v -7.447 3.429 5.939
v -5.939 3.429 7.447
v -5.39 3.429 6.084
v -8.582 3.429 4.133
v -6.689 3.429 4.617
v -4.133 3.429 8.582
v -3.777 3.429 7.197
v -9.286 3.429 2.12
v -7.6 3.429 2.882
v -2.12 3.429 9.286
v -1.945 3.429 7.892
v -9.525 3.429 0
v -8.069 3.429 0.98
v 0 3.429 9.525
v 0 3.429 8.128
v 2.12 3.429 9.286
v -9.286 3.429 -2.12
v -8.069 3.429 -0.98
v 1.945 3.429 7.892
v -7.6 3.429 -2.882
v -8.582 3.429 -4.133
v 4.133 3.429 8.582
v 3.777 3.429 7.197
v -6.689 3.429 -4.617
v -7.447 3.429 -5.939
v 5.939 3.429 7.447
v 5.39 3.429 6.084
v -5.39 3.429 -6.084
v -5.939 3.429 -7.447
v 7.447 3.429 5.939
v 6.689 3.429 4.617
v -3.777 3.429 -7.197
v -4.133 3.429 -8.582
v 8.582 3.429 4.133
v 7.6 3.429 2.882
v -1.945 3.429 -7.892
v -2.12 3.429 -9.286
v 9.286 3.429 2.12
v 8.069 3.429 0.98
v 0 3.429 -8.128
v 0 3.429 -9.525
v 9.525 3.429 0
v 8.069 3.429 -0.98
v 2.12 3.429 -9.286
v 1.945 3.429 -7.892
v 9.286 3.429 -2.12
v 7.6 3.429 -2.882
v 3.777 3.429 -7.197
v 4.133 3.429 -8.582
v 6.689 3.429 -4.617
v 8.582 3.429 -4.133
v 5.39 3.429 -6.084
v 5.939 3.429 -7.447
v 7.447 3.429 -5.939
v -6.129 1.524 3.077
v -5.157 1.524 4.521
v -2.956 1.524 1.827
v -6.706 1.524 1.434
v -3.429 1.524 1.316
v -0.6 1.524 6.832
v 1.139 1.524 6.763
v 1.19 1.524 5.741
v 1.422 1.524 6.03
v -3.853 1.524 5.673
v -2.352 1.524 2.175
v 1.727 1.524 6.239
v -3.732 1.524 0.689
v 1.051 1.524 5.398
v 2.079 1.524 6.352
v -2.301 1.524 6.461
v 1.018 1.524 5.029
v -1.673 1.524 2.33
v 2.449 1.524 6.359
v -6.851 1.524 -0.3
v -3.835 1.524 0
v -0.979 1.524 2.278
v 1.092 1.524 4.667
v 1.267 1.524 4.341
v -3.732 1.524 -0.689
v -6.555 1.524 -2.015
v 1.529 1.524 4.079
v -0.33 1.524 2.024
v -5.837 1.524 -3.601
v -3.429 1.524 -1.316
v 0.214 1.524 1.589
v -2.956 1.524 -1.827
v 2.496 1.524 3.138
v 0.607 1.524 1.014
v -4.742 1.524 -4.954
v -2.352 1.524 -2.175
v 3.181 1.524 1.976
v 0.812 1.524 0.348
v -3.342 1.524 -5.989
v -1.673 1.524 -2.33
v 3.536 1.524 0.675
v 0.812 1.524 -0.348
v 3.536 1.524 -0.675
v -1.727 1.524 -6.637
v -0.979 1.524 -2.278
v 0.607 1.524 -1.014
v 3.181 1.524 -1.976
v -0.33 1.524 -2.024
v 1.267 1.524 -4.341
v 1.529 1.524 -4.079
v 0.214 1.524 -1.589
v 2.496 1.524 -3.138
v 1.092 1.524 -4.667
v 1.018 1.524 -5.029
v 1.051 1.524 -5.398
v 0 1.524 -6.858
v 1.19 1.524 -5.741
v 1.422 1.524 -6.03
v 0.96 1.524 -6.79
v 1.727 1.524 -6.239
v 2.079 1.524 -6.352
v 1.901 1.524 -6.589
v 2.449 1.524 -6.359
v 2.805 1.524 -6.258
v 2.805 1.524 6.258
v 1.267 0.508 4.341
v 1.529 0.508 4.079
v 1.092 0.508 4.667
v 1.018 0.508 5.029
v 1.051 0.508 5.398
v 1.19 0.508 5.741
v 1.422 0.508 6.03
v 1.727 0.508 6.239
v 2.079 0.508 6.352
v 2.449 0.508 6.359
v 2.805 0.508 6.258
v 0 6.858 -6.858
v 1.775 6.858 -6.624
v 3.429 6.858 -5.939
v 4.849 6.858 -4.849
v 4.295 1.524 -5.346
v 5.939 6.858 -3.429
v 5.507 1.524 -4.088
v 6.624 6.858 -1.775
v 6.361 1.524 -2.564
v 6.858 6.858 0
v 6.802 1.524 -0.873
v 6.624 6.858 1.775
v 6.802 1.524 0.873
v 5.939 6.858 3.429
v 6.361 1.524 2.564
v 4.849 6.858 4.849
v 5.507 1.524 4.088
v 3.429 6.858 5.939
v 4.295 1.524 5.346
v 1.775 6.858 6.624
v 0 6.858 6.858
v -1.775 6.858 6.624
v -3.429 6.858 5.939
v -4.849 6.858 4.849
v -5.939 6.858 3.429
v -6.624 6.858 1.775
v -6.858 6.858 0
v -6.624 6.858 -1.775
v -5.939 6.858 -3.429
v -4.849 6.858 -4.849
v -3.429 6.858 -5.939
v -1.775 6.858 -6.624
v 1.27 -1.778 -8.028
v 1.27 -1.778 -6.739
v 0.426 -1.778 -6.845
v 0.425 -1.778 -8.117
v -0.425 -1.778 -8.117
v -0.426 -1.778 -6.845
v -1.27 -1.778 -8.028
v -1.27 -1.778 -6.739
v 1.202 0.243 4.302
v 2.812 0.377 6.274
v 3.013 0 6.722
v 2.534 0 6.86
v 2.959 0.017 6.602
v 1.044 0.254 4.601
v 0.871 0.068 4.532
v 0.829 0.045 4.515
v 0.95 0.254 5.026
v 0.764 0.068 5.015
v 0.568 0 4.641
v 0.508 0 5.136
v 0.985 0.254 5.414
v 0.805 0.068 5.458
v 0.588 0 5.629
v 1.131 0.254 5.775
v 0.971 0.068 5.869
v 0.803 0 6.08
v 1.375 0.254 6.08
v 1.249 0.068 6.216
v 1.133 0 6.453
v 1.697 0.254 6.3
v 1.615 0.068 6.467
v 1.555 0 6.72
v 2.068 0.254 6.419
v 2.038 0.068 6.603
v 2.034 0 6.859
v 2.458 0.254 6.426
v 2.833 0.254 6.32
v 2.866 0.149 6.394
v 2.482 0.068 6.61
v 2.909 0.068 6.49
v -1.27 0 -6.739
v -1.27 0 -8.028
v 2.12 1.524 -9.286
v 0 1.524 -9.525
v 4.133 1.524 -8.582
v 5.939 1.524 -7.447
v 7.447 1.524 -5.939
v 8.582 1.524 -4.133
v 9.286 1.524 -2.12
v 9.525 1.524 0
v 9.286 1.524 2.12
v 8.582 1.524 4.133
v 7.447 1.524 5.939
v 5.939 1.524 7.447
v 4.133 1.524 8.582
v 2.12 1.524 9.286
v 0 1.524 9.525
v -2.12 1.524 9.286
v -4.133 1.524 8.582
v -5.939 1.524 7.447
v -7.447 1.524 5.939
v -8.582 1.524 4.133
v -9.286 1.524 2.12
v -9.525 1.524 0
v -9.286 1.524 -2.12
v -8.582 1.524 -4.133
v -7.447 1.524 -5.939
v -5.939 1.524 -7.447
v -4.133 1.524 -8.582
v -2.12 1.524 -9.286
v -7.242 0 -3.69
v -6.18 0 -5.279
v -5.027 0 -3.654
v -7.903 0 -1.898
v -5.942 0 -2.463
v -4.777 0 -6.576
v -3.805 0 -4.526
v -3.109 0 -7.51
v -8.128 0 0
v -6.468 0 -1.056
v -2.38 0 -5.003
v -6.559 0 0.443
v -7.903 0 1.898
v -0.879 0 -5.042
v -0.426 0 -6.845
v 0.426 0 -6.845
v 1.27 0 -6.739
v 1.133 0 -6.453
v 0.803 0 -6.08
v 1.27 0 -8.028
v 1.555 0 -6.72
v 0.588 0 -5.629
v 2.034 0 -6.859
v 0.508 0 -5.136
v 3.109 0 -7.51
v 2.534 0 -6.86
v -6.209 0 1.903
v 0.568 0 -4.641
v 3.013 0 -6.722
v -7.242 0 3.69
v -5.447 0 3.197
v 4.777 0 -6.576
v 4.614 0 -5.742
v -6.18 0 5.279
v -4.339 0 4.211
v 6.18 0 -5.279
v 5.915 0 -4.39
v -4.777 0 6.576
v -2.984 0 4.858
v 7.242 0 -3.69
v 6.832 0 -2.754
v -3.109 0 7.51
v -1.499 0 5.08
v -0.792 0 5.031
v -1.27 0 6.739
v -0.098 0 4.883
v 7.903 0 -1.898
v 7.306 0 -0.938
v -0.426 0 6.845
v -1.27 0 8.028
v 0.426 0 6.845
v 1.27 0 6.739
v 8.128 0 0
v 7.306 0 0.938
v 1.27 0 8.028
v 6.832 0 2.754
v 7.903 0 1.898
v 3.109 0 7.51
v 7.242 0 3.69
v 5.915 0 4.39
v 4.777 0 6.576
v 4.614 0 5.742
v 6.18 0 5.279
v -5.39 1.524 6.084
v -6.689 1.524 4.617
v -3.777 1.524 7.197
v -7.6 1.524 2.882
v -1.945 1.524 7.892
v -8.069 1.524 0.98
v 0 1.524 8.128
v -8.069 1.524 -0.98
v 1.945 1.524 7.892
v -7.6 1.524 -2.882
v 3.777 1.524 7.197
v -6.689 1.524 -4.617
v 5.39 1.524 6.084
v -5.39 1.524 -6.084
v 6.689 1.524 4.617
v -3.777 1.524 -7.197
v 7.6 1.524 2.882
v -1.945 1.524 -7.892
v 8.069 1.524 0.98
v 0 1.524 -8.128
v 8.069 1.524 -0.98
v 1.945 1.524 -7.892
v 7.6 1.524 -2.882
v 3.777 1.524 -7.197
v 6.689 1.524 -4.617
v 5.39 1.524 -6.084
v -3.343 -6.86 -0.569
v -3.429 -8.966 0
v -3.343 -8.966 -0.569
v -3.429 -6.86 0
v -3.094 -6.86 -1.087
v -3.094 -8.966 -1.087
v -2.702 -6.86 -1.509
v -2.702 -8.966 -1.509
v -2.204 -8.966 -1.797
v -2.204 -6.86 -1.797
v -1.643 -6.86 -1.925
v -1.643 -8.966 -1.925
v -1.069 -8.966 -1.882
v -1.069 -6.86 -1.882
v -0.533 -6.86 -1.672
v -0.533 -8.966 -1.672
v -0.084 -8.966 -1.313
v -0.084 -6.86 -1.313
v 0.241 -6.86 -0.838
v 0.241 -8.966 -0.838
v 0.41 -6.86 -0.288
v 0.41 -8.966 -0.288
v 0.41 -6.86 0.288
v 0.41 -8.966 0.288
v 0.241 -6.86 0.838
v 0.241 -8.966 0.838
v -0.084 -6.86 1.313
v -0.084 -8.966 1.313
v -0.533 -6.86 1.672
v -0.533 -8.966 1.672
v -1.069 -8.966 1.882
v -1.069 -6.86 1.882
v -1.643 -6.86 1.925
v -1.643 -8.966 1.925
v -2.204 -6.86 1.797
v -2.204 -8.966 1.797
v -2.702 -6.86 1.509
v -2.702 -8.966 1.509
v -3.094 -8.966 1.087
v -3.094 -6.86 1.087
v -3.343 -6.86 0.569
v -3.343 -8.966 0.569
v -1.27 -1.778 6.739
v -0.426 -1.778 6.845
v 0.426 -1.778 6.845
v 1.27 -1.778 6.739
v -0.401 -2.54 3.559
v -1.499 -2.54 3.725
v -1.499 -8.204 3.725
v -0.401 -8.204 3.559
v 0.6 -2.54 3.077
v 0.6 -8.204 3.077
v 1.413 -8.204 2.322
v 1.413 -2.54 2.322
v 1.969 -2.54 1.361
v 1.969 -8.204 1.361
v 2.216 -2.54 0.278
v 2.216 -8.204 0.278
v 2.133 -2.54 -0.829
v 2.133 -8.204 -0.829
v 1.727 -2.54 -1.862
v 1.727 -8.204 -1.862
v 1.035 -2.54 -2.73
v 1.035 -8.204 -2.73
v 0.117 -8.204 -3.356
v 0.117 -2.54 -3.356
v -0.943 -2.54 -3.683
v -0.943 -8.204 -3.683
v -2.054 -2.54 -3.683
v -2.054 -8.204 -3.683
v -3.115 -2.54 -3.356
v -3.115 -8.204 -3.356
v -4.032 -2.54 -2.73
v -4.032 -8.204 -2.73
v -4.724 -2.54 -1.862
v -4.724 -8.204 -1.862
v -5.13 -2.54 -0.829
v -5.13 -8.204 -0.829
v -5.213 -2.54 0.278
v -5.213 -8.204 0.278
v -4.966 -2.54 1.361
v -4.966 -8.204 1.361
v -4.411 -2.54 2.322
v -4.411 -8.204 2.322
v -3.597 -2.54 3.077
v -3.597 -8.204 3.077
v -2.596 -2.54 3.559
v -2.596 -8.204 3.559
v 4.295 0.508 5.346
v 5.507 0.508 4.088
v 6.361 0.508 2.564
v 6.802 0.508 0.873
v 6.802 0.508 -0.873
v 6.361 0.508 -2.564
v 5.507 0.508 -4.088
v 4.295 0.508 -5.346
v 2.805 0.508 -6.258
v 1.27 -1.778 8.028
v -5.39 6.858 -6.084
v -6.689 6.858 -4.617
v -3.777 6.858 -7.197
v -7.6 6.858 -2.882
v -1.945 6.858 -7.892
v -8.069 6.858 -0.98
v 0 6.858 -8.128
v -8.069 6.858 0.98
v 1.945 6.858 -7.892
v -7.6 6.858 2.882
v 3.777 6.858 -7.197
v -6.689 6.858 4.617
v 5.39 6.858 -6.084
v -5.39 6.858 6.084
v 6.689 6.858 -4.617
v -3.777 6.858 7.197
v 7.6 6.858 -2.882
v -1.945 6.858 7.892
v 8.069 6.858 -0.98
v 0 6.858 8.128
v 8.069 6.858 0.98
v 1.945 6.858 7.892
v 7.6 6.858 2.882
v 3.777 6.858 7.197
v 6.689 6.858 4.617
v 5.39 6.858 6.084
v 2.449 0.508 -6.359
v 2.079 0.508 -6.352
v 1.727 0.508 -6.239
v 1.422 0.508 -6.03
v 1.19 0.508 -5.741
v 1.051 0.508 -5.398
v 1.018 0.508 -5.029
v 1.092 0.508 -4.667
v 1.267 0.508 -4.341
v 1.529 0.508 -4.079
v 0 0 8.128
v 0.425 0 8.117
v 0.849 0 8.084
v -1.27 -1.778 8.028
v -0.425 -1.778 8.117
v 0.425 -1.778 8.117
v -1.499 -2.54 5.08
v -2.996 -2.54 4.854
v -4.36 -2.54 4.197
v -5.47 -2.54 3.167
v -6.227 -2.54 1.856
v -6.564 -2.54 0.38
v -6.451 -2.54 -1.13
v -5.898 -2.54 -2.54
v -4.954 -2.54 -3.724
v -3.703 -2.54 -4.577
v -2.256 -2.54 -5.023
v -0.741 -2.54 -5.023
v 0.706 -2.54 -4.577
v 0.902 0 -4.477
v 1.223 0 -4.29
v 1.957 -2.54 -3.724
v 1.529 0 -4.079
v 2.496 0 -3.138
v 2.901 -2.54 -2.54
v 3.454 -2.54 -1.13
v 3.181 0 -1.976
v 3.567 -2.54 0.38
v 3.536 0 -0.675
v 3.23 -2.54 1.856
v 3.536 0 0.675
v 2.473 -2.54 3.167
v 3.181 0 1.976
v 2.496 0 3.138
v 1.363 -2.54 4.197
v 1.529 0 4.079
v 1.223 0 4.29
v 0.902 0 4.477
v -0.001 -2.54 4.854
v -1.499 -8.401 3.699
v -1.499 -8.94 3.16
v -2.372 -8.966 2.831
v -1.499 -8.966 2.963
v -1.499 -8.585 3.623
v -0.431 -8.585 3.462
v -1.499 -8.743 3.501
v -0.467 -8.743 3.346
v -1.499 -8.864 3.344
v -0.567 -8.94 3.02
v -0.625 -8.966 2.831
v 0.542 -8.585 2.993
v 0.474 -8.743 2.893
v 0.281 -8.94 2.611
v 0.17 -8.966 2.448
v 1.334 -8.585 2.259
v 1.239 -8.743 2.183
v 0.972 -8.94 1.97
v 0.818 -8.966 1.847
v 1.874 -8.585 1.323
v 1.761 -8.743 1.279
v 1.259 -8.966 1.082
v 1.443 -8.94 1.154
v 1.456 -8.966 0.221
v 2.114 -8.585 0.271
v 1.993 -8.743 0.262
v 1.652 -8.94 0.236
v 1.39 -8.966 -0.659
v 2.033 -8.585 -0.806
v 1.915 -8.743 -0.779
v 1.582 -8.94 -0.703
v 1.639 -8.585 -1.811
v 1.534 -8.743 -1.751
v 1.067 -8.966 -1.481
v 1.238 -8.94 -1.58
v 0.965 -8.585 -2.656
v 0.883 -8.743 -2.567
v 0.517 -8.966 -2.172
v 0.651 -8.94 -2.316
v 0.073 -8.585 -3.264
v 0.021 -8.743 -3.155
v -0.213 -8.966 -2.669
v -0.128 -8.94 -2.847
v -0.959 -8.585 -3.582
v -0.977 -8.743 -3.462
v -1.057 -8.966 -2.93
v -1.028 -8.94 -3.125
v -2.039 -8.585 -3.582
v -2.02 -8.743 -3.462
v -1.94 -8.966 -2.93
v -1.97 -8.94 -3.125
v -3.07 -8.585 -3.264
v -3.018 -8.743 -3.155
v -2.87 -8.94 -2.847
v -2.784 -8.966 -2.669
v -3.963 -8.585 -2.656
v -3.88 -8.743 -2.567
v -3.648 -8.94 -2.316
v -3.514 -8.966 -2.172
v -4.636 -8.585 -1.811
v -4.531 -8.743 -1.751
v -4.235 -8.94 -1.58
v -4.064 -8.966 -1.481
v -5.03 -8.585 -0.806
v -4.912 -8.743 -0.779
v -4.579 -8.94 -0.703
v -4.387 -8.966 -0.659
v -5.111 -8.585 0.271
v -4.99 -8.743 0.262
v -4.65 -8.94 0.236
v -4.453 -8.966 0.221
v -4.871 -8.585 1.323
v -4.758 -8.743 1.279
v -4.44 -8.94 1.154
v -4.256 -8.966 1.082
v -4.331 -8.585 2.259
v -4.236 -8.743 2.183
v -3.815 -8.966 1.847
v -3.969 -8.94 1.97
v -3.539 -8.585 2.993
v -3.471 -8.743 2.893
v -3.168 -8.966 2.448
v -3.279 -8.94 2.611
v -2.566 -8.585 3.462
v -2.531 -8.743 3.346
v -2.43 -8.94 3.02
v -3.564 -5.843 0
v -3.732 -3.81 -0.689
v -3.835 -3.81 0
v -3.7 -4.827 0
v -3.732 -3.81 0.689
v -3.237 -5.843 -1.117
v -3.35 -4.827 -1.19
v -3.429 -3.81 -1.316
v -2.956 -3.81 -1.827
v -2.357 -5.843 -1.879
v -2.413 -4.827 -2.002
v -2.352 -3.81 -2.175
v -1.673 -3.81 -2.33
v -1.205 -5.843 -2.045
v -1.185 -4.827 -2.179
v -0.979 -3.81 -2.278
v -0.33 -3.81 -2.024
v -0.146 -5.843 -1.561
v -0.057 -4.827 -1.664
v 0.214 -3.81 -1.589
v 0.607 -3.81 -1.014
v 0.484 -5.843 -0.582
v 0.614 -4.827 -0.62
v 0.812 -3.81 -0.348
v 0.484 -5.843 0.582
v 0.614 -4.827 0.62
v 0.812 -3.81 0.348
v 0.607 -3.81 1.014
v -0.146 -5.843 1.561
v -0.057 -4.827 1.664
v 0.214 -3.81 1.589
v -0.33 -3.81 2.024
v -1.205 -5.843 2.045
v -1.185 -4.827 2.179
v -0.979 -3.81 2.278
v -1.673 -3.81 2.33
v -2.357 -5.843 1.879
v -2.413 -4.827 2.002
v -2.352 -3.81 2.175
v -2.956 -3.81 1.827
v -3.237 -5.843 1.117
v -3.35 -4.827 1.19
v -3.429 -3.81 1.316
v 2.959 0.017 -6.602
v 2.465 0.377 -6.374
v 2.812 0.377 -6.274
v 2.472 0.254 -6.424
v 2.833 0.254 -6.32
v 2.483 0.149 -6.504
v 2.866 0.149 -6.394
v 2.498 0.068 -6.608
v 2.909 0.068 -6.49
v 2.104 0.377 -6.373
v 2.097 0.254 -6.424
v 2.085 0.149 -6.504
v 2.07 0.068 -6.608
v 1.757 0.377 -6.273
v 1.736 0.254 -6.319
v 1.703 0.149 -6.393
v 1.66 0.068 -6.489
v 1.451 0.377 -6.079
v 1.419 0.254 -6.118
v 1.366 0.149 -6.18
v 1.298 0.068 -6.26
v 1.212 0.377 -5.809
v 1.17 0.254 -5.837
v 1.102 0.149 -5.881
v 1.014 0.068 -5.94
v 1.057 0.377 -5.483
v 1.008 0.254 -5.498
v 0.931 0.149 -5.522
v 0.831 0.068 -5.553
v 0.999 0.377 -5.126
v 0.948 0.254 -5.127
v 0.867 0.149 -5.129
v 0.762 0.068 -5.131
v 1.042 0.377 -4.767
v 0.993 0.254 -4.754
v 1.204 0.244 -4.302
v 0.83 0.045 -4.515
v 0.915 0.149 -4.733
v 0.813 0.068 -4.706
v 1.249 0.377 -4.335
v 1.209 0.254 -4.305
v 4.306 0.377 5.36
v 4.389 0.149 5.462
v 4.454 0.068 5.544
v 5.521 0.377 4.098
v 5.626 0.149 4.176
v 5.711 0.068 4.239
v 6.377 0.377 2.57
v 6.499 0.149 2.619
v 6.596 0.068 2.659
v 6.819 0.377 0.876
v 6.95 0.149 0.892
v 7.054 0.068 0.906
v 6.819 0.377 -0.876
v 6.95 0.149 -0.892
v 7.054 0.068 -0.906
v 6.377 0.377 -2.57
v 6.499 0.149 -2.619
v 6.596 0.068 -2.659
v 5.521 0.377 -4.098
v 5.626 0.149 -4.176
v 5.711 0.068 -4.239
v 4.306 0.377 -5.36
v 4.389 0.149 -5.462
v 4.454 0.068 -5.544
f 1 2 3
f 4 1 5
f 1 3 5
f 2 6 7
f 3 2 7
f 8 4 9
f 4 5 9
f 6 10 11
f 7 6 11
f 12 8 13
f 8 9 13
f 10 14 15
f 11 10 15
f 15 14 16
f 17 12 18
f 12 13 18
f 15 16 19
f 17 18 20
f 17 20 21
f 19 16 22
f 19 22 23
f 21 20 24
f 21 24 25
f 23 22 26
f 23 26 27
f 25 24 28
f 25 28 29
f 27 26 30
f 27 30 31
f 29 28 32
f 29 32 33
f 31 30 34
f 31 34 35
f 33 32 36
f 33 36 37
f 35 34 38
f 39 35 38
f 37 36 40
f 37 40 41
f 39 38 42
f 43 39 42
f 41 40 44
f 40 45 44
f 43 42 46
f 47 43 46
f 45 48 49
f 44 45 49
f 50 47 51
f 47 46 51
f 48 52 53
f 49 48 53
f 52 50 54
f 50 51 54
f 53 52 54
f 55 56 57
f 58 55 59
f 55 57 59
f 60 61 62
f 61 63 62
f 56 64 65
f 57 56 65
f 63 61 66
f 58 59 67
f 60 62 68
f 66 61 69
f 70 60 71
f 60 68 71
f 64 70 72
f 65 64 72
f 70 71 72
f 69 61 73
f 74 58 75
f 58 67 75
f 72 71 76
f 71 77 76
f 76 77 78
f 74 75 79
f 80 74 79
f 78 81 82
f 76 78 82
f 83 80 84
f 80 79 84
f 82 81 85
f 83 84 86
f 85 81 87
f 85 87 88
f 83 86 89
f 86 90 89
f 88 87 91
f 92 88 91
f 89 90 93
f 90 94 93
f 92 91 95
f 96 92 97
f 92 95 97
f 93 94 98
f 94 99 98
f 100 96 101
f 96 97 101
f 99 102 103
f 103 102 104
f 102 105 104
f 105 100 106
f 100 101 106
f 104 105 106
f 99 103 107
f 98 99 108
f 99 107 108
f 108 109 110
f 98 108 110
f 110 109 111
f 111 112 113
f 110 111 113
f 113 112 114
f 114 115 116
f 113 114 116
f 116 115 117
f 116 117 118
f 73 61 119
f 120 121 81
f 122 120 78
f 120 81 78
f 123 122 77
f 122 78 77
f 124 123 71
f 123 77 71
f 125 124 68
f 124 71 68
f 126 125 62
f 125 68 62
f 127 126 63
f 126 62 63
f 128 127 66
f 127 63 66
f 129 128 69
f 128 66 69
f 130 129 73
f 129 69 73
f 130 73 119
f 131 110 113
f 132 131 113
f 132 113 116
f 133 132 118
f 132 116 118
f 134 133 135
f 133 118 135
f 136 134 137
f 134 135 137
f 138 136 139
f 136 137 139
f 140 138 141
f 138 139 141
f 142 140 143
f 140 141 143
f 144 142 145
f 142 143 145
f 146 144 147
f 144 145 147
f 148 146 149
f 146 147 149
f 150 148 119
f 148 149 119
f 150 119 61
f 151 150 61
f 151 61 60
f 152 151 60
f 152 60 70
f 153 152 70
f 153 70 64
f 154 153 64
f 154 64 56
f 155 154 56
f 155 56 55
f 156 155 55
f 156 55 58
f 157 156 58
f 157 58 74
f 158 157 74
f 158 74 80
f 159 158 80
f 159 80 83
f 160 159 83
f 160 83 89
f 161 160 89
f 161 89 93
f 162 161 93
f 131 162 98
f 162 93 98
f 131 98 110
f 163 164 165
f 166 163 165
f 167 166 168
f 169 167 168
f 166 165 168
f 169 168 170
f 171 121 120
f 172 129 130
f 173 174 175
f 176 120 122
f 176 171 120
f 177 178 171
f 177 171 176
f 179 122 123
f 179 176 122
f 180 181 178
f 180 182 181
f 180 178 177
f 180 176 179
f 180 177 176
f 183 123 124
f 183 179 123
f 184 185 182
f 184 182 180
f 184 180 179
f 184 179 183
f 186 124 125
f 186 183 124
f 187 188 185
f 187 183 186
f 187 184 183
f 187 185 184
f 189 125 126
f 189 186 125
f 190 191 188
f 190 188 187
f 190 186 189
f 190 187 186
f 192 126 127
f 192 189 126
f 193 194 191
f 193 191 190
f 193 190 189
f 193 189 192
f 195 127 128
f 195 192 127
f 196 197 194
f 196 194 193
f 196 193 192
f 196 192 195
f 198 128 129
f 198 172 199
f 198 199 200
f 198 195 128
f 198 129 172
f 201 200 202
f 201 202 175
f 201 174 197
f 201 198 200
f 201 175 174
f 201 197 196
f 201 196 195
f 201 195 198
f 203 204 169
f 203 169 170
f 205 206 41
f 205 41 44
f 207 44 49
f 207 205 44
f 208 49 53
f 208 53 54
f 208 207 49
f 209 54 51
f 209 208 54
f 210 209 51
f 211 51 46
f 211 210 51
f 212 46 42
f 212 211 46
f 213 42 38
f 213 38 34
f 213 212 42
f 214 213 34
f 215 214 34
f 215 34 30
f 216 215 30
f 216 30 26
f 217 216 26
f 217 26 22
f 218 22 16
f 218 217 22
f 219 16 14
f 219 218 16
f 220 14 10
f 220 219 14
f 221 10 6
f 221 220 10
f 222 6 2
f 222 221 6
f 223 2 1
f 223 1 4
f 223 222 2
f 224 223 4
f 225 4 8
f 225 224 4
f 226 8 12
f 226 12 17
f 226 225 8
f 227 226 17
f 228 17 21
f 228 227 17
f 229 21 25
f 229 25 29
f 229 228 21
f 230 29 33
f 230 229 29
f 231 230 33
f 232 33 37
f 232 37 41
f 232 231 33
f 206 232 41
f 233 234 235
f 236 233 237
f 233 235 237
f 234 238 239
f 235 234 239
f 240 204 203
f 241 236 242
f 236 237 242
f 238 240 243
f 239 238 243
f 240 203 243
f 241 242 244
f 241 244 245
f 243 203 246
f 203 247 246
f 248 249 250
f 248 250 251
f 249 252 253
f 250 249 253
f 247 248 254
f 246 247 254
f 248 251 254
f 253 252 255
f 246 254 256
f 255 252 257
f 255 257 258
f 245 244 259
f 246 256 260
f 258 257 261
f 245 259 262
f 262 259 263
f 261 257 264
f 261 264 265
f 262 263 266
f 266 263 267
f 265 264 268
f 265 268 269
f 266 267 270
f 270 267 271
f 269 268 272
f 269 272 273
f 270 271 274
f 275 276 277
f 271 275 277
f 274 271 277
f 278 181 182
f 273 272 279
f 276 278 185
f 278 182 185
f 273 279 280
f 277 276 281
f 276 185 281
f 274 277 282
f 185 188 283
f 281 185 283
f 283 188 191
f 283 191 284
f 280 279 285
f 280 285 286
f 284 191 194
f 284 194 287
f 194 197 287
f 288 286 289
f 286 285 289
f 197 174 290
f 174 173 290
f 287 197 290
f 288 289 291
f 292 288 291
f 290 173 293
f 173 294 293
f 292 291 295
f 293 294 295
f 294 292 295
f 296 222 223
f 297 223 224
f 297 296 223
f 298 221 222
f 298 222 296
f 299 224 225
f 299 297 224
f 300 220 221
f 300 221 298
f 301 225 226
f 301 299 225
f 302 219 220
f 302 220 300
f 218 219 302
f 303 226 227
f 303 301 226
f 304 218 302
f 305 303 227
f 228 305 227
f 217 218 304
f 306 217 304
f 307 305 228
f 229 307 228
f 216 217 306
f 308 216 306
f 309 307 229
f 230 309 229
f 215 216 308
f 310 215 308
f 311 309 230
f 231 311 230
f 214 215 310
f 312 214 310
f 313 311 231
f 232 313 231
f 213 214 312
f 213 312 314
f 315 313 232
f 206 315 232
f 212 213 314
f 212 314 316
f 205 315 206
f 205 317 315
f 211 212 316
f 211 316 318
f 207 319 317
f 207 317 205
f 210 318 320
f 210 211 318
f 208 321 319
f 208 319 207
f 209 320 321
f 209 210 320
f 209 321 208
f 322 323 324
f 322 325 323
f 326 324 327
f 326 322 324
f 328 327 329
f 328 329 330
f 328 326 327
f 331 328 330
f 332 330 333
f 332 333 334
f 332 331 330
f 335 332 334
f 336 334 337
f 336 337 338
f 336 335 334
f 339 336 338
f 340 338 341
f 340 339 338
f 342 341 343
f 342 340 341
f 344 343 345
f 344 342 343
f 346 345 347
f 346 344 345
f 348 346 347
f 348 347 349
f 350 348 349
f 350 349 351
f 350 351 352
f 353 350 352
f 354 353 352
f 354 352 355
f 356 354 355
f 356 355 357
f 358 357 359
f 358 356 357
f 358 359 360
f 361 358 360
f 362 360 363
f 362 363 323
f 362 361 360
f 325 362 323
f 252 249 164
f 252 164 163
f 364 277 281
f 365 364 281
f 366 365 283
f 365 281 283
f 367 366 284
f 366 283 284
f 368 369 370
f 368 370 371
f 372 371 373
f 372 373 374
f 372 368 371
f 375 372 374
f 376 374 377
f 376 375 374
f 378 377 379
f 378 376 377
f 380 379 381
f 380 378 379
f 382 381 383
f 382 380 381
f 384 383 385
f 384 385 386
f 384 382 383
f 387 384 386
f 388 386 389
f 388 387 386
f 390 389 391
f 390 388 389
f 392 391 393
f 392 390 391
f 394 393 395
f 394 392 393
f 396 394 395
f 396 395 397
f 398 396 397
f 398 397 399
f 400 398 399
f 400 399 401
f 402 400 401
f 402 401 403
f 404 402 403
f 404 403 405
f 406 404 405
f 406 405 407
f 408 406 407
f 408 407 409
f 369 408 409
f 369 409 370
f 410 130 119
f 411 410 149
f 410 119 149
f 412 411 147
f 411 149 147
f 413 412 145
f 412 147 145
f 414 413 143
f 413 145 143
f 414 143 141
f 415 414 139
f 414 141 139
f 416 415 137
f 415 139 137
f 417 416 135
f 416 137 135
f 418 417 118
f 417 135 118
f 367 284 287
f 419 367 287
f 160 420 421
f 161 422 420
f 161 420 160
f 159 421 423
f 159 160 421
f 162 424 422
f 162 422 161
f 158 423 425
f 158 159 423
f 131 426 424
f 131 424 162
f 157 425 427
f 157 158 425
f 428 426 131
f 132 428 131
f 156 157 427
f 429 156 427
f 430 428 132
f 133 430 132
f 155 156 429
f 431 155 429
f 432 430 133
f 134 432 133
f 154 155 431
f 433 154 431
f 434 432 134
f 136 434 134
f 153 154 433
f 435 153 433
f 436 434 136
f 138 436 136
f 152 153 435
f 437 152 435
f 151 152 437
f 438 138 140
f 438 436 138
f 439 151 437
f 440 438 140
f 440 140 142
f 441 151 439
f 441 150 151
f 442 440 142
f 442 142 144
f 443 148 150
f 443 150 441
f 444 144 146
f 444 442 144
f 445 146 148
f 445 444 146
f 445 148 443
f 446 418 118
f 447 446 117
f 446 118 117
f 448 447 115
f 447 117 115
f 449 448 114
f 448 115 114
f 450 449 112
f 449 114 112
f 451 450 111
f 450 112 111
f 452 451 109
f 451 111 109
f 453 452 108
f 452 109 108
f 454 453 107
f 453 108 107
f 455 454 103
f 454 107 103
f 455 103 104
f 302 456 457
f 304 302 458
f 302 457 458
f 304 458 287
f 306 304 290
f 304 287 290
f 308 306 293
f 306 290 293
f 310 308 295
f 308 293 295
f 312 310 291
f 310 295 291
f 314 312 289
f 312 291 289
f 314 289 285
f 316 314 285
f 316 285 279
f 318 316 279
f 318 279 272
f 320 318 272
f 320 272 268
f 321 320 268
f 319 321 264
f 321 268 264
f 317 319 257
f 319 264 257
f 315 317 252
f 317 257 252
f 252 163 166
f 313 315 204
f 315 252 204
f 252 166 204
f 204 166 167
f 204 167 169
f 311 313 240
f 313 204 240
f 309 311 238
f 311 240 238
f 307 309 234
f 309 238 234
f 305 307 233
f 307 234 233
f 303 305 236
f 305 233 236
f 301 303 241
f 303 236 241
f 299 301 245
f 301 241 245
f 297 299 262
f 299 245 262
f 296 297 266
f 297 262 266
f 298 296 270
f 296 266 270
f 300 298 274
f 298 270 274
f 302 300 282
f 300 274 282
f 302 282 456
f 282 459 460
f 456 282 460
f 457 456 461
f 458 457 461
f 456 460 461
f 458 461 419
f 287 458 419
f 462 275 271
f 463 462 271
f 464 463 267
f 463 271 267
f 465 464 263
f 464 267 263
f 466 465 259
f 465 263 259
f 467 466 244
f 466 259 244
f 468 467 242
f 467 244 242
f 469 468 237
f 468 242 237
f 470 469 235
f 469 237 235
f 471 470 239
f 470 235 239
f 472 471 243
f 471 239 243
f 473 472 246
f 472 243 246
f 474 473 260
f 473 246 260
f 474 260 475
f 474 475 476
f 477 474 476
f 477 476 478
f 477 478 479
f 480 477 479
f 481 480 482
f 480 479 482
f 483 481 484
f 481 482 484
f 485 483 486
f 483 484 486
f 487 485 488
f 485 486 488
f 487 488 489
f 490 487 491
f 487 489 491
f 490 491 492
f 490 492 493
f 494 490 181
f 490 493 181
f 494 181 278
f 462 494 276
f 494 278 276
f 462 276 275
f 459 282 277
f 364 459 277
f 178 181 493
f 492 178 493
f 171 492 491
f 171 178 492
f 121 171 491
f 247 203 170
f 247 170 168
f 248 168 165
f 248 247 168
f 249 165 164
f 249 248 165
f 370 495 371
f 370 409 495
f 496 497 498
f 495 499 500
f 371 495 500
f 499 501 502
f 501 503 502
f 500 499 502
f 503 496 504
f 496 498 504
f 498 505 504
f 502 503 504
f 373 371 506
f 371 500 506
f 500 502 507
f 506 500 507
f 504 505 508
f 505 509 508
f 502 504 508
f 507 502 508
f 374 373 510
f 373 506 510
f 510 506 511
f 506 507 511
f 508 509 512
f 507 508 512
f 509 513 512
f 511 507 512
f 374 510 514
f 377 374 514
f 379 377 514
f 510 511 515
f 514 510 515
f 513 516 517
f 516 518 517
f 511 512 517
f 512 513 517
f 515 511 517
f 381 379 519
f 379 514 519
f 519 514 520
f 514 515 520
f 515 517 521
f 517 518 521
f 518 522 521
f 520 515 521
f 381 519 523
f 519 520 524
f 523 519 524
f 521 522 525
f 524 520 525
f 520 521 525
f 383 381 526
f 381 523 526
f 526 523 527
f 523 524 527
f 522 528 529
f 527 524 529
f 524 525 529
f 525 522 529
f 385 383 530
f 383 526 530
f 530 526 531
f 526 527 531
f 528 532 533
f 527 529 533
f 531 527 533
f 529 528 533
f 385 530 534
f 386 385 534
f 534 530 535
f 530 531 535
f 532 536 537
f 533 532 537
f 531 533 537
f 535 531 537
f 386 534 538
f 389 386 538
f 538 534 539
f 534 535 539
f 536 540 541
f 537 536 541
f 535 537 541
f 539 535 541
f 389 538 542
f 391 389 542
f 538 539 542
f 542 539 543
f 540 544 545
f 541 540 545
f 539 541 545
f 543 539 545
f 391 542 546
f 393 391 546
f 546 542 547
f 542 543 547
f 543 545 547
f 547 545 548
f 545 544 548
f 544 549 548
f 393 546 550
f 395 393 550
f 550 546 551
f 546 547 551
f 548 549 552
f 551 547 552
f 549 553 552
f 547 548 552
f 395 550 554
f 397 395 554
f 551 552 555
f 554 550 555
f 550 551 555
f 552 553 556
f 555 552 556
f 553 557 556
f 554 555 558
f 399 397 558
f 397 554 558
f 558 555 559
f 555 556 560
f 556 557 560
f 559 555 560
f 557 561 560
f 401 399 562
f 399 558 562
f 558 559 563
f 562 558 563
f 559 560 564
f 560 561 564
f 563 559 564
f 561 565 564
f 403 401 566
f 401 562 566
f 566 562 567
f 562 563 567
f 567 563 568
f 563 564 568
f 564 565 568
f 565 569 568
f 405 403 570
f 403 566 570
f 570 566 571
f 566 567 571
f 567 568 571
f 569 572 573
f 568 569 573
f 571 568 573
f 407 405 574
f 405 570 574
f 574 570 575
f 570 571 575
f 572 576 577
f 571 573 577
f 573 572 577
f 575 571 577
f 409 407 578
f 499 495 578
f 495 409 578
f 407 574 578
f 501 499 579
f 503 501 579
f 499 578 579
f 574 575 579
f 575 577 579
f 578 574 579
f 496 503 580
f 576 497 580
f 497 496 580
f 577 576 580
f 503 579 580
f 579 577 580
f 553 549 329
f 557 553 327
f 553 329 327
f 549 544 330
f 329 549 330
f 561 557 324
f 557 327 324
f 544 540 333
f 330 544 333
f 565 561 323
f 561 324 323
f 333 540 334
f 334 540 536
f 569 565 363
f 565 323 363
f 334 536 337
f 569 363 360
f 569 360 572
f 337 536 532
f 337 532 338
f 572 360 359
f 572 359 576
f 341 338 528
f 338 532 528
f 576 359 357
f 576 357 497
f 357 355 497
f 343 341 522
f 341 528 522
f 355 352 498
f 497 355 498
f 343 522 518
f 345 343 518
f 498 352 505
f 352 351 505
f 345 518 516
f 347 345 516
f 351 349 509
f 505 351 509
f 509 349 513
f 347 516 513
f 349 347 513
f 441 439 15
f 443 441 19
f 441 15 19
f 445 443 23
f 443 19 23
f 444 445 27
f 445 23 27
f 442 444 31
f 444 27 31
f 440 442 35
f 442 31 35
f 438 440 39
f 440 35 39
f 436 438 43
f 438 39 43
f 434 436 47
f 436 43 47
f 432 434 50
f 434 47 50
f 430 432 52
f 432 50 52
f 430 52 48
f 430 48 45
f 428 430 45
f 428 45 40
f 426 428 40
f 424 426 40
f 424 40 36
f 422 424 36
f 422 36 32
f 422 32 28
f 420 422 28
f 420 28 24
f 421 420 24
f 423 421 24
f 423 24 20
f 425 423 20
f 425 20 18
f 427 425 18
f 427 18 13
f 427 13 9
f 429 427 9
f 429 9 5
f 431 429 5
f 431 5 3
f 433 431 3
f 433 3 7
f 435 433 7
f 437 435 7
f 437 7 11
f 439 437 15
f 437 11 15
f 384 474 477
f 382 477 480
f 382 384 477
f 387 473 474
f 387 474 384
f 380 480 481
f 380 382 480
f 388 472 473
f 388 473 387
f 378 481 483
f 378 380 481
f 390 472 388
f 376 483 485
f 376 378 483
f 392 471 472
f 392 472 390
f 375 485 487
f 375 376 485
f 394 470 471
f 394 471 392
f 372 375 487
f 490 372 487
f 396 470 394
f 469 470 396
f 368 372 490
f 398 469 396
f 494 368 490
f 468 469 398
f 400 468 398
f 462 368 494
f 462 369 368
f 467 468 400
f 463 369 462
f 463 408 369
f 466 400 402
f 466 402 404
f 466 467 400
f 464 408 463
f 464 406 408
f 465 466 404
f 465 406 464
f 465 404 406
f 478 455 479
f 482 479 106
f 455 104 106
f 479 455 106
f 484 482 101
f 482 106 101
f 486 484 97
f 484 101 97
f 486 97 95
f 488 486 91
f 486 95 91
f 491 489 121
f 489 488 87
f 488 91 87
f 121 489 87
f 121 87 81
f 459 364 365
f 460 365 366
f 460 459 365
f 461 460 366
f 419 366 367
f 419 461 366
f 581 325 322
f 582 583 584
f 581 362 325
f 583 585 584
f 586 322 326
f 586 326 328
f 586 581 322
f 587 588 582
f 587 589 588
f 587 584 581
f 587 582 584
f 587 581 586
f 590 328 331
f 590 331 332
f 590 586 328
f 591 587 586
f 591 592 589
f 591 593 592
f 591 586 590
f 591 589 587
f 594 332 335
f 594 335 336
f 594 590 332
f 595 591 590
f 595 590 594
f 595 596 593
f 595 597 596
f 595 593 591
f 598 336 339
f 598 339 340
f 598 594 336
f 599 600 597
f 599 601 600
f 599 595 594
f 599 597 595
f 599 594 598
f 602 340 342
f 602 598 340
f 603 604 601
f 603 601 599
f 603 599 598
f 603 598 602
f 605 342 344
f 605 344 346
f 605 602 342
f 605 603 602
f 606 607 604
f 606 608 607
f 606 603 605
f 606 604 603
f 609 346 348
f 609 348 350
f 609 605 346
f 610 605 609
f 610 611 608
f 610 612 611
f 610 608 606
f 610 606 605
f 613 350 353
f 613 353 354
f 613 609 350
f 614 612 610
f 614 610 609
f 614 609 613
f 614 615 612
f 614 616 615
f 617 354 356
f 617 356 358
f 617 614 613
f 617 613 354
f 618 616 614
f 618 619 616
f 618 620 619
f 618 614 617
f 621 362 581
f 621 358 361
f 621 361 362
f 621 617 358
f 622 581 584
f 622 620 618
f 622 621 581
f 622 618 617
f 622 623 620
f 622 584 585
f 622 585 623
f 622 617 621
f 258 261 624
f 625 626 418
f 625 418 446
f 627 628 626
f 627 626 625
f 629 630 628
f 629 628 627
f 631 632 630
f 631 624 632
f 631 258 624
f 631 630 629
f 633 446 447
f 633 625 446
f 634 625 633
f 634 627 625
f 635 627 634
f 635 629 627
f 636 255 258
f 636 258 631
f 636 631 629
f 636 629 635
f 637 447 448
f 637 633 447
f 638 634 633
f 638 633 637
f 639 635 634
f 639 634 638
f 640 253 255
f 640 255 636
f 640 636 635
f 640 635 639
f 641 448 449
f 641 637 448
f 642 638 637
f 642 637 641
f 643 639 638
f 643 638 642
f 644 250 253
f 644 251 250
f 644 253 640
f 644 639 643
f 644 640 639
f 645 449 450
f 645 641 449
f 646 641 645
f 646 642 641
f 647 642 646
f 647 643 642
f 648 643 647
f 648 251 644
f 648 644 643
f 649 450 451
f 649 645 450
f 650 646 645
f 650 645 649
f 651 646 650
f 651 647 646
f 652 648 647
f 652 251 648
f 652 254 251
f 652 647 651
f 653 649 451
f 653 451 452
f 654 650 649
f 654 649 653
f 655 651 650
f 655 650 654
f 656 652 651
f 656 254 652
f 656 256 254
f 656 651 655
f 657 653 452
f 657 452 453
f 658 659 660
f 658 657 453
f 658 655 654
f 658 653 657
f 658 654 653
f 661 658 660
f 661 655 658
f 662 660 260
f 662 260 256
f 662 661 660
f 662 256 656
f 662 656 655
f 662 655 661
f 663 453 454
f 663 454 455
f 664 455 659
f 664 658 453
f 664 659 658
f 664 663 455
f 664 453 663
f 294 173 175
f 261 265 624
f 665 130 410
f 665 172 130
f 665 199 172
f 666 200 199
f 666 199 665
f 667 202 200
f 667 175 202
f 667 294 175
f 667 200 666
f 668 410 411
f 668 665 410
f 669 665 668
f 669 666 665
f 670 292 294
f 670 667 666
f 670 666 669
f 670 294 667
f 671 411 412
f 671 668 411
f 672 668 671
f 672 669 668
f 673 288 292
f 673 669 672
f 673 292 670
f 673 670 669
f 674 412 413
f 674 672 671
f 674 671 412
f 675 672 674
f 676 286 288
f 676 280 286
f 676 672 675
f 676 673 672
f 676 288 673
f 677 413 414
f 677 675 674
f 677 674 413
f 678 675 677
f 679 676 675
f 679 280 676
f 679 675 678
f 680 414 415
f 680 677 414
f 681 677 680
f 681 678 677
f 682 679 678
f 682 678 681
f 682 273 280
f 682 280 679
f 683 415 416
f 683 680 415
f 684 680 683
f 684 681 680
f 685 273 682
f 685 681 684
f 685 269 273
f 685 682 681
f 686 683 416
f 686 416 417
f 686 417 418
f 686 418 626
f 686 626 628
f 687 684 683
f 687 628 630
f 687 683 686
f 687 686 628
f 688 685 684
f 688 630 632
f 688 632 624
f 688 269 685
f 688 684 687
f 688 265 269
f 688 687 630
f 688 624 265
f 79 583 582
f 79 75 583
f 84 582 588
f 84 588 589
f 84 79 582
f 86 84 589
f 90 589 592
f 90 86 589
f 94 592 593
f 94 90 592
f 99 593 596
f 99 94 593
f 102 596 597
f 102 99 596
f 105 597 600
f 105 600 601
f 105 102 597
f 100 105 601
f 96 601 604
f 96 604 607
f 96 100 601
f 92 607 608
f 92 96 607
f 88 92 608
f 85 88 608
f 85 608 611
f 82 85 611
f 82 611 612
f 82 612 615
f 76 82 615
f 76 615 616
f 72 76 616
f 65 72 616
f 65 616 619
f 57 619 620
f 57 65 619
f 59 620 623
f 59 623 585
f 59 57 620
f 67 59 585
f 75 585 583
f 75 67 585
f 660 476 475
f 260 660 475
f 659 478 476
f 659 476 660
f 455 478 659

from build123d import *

# Parameters (mm, degrees)
SKETCH1_R              = 8.128
TOP_BODY_DEPTH         = 6.858
SKETCH2_R              = 5.08
ECCENTRIC_SLEEVE_DEPTH = 2.54
SKETCH3_R              = 3.724670389
ECCENTRIC_SHAFT_DEPTH  = 15.8242
SKETCH4_R              = 9.525
FLANGE_DEPTH           = 1.905
SKETCH5_R              = 6.858
TOP_HOLE_DEPTH         = 18.073240643
GROOVE_DEPTH           = 18.073240643
PINS_DEPTH             = 1.778
FILLET1_R              = 0.508
FILLET2_R              = 0.762


with BuildPart() as part:
    # Sketch1 → Top Body (new body)
    with BuildSketch(Plane(origin=(0, 0, 0), x_dir=(1, 0, 0), z_dir=(0, 1, 0))):
        with Locations(Location((0, 0, 0), (0, 0, 270))):
            Circle(SKETCH1_R)
    extrude(amount=TOP_BODY_DEPTH)

    # Sketch2 → Eccentric Sleeve (add)
    with BuildSketch(Plane.XZ):
        with Locations(Location((-1.4986, 0, 0), (0, 0, 90))):
            Circle(SKETCH2_R)
    extrude(amount=ECCENTRIC_SLEEVE_DEPTH)

    # Sketch3 → Eccentric Shaft (add)
    with BuildSketch(Plane(origin=(0, 6.858, 0), x_dir=(-1, 0, 0), z_dir=(0, 1, 0))):
        with Locations(Location((1.4986, 0, 0), (0, 0, 90))):
            Circle(SKETCH3_R)
    extrude(amount=-ECCENTRIC_SHAFT_DEPTH)

    # Sketch4 → Flange (add)
    with BuildSketch(Plane.XZ.offset(-1.524)):
        with Locations(Location((0, 0, 0), (0, 0, 270))):
            Circle(SKETCH4_R)
    extrude(amount=-FLANGE_DEPTH)

    # Sketch5 → Top Hole (cut, through all)
    with BuildSketch(Plane.XZ.offset(-1.524)):
        with Locations(Location((0, 0, 0), (0, 0, 270))):
            Circle(SKETCH5_R)
    extrude(amount=-TOP_HOLE_DEPTH, mode=Mode.SUBTRACT)

    # Sketch6 → Tapped Hole (revolve, cut)
    with BuildSketch(Plane.XY, mode=Mode.PRIVATE) as tapped_hole_sk:
        Polygon((0.8382, 1.524), (-1.4986, 1.524), (-1.4986, -8.9662), (0.4318, -8.9662), (0.4318, -6.859631692), (0.8382, -3.81), align=None)
    revolve(tapped_hole_sk.sketch.rotate(Axis((-1.4986, 5.365186462, 0), (0, -1, 0)), 180), axis=Axis((-1.4986, 5.365186462, 0), (0, -1, 0)), mode=Mode.SUBTRACT)

    # Sketch7 → Groove (cut, through all)
    with BuildSketch(Plane(origin=(0, 1.524, 0), x_dir=(-1, 0, 0), z_dir=(0, 1, 0))):
        with BuildLine():
            ThreePointArc((-2.805281279, 6.257999756), (-6.858, 0), (-2.805281279, -6.257999756))
            ThreePointArc((-2.805281279, -6.257999756), (-1.189982392, -5.741074463), (-1.528907797, -4.07928873))
            ThreePointArc((-1.528907797, -4.07928873), (-3.5814, 0), (-1.528907797, 4.07928873))
            ThreePointArc((-1.528907797, 4.07928873), (-1.189982392, 5.741074463), (-2.805281279, 6.257999756))
        make_face()
    extrude(amount=-GROOVE_DEPTH, mode=Mode.SUBTRACT)

    # Sketch8 → Pins (add)
    with BuildSketch(Plane.XZ):
        with BuildLine():
            Line((-1.27, 8.02816816), (-1.27, 6.739381574))
            ThreePointArc((-1.27, 6.739381574), (0, 6.858), (1.27, 6.739381574))
            Line((1.27, 6.739381574), (1.27, 8.02816816))
            ThreePointArc((1.27, 8.02816816), (0, 8.128), (-1.27, 8.02816816))
        make_face()
        with BuildLine():
            Line((1.27, -6.739381574), (1.27, -8.02816816))
            ThreePointArc((1.27, -8.02816816), (0, -8.128), (-1.27, -8.02816816))
            Line((-1.27, -8.02816816), (-1.27, -6.739381574))
            ThreePointArc((-1.27, -6.739381574), (0, -6.858), (1.27, -6.739381574))
        make_face()
    extrude(amount=PINS_DEPTH)

    # Fillet1
    # the kernel refuses this fillet: 0.508 mm, written as the material it takes off along each edge
    with BuildSketch(Plane(origin=(2.285784746, 0, -5.099110912), x_dir=(0.40905238828967766, 0, -0.9125109005565417), z_dir=(0.9125109005565417, 0, 0.40905238828967766))) as fillet1_piece_1_section:
        with BuildLine():
            CenterArc((1.27 + FILLET1_R, FILLET1_R), FILLET1_R, 180, 90)
            Line((1.27, FILLET1_R), (1.27, 0))
            Line((1.27, 0), (1.27 + FILLET1_R, 0))
        make_face()
    fillet1_piece_1 = revolve(axis=Axis((2.285784746, 0, -5.099110912), (0, 1, 0)), revolution_arc=224.939404777, mode=Mode.PRIVATE)
    fillet1_piece_1 = fillet1_piece_1 - Plane(origin=(-1.4986, 0.082765889, 0), x_dir=(0, 0, 1), z_dir=(0, 1, 0)) * Cylinder(5.08, 8, mode=Mode.PRIVATE)
    add(fillet1_piece_1, mode=Mode.SUBTRACT)
    with BuildSketch(Plane(origin=(0, 0, 0), x_dir=(0.40905238828967727, 0, 0.9125109005565418), z_dir=(-0.9125109005565418, 0, 0.40905238828967727))) as fillet1_piece_2:
        with BuildLine():
            CenterArc((6.858 + FILLET1_R, FILLET1_R), FILLET1_R, 180, 90)
            Line((6.858, FILLET1_R), (6.858, 0))
            Line((6.858, 0), (6.858 + FILLET1_R, 0))
        make_face()
    revolve(axis=Axis((0, 0, 0), (0, 1, 0)), revolution_arc=131.709357588, mode=Mode.SUBTRACT)
    with BuildSketch(Plane(origin=(2.285784746, 0, 5.099110912), x_dir=(0.355010429323337, 0, -0.9348623401718886), z_dir=(0.9348623401718886, 0, 0.355010429323337))) as fillet1_piece_3_section:
        with BuildLine():
            CenterArc((1.27 + FILLET1_R, FILLET1_R), FILLET1_R, 180, 90)
            Line((1.27, FILLET1_R), (1.27, 0))
            Line((1.27, 0), (1.27 + FILLET1_R, 0))
        make_face()
    fillet1_piece_3 = revolve(axis=Axis((2.285784746, 0, 5.099110912), (0, 1, 0)), revolution_arc=224.939404777, mode=Mode.PRIVATE)
    fillet1_piece_3 = fillet1_piece_3 - Plane(origin=(-1.4986, 0.254, 0), x_dir=(0, 0, 1), z_dir=(0, 1, 0)) * Cylinder(5.08, 8, mode=Mode.PRIVATE)
    add(fillet1_piece_3, mode=Mode.SUBTRACT)

    # Fillet2
    fillet2_edges = [part.edges().sort_by_distance(p)[0] for p in [
        (-1.4986, -8.9662, -3.724670389),
    ]]
    fillet(fillet2_edges, radius=FILLET2_R)


solid = part.part
